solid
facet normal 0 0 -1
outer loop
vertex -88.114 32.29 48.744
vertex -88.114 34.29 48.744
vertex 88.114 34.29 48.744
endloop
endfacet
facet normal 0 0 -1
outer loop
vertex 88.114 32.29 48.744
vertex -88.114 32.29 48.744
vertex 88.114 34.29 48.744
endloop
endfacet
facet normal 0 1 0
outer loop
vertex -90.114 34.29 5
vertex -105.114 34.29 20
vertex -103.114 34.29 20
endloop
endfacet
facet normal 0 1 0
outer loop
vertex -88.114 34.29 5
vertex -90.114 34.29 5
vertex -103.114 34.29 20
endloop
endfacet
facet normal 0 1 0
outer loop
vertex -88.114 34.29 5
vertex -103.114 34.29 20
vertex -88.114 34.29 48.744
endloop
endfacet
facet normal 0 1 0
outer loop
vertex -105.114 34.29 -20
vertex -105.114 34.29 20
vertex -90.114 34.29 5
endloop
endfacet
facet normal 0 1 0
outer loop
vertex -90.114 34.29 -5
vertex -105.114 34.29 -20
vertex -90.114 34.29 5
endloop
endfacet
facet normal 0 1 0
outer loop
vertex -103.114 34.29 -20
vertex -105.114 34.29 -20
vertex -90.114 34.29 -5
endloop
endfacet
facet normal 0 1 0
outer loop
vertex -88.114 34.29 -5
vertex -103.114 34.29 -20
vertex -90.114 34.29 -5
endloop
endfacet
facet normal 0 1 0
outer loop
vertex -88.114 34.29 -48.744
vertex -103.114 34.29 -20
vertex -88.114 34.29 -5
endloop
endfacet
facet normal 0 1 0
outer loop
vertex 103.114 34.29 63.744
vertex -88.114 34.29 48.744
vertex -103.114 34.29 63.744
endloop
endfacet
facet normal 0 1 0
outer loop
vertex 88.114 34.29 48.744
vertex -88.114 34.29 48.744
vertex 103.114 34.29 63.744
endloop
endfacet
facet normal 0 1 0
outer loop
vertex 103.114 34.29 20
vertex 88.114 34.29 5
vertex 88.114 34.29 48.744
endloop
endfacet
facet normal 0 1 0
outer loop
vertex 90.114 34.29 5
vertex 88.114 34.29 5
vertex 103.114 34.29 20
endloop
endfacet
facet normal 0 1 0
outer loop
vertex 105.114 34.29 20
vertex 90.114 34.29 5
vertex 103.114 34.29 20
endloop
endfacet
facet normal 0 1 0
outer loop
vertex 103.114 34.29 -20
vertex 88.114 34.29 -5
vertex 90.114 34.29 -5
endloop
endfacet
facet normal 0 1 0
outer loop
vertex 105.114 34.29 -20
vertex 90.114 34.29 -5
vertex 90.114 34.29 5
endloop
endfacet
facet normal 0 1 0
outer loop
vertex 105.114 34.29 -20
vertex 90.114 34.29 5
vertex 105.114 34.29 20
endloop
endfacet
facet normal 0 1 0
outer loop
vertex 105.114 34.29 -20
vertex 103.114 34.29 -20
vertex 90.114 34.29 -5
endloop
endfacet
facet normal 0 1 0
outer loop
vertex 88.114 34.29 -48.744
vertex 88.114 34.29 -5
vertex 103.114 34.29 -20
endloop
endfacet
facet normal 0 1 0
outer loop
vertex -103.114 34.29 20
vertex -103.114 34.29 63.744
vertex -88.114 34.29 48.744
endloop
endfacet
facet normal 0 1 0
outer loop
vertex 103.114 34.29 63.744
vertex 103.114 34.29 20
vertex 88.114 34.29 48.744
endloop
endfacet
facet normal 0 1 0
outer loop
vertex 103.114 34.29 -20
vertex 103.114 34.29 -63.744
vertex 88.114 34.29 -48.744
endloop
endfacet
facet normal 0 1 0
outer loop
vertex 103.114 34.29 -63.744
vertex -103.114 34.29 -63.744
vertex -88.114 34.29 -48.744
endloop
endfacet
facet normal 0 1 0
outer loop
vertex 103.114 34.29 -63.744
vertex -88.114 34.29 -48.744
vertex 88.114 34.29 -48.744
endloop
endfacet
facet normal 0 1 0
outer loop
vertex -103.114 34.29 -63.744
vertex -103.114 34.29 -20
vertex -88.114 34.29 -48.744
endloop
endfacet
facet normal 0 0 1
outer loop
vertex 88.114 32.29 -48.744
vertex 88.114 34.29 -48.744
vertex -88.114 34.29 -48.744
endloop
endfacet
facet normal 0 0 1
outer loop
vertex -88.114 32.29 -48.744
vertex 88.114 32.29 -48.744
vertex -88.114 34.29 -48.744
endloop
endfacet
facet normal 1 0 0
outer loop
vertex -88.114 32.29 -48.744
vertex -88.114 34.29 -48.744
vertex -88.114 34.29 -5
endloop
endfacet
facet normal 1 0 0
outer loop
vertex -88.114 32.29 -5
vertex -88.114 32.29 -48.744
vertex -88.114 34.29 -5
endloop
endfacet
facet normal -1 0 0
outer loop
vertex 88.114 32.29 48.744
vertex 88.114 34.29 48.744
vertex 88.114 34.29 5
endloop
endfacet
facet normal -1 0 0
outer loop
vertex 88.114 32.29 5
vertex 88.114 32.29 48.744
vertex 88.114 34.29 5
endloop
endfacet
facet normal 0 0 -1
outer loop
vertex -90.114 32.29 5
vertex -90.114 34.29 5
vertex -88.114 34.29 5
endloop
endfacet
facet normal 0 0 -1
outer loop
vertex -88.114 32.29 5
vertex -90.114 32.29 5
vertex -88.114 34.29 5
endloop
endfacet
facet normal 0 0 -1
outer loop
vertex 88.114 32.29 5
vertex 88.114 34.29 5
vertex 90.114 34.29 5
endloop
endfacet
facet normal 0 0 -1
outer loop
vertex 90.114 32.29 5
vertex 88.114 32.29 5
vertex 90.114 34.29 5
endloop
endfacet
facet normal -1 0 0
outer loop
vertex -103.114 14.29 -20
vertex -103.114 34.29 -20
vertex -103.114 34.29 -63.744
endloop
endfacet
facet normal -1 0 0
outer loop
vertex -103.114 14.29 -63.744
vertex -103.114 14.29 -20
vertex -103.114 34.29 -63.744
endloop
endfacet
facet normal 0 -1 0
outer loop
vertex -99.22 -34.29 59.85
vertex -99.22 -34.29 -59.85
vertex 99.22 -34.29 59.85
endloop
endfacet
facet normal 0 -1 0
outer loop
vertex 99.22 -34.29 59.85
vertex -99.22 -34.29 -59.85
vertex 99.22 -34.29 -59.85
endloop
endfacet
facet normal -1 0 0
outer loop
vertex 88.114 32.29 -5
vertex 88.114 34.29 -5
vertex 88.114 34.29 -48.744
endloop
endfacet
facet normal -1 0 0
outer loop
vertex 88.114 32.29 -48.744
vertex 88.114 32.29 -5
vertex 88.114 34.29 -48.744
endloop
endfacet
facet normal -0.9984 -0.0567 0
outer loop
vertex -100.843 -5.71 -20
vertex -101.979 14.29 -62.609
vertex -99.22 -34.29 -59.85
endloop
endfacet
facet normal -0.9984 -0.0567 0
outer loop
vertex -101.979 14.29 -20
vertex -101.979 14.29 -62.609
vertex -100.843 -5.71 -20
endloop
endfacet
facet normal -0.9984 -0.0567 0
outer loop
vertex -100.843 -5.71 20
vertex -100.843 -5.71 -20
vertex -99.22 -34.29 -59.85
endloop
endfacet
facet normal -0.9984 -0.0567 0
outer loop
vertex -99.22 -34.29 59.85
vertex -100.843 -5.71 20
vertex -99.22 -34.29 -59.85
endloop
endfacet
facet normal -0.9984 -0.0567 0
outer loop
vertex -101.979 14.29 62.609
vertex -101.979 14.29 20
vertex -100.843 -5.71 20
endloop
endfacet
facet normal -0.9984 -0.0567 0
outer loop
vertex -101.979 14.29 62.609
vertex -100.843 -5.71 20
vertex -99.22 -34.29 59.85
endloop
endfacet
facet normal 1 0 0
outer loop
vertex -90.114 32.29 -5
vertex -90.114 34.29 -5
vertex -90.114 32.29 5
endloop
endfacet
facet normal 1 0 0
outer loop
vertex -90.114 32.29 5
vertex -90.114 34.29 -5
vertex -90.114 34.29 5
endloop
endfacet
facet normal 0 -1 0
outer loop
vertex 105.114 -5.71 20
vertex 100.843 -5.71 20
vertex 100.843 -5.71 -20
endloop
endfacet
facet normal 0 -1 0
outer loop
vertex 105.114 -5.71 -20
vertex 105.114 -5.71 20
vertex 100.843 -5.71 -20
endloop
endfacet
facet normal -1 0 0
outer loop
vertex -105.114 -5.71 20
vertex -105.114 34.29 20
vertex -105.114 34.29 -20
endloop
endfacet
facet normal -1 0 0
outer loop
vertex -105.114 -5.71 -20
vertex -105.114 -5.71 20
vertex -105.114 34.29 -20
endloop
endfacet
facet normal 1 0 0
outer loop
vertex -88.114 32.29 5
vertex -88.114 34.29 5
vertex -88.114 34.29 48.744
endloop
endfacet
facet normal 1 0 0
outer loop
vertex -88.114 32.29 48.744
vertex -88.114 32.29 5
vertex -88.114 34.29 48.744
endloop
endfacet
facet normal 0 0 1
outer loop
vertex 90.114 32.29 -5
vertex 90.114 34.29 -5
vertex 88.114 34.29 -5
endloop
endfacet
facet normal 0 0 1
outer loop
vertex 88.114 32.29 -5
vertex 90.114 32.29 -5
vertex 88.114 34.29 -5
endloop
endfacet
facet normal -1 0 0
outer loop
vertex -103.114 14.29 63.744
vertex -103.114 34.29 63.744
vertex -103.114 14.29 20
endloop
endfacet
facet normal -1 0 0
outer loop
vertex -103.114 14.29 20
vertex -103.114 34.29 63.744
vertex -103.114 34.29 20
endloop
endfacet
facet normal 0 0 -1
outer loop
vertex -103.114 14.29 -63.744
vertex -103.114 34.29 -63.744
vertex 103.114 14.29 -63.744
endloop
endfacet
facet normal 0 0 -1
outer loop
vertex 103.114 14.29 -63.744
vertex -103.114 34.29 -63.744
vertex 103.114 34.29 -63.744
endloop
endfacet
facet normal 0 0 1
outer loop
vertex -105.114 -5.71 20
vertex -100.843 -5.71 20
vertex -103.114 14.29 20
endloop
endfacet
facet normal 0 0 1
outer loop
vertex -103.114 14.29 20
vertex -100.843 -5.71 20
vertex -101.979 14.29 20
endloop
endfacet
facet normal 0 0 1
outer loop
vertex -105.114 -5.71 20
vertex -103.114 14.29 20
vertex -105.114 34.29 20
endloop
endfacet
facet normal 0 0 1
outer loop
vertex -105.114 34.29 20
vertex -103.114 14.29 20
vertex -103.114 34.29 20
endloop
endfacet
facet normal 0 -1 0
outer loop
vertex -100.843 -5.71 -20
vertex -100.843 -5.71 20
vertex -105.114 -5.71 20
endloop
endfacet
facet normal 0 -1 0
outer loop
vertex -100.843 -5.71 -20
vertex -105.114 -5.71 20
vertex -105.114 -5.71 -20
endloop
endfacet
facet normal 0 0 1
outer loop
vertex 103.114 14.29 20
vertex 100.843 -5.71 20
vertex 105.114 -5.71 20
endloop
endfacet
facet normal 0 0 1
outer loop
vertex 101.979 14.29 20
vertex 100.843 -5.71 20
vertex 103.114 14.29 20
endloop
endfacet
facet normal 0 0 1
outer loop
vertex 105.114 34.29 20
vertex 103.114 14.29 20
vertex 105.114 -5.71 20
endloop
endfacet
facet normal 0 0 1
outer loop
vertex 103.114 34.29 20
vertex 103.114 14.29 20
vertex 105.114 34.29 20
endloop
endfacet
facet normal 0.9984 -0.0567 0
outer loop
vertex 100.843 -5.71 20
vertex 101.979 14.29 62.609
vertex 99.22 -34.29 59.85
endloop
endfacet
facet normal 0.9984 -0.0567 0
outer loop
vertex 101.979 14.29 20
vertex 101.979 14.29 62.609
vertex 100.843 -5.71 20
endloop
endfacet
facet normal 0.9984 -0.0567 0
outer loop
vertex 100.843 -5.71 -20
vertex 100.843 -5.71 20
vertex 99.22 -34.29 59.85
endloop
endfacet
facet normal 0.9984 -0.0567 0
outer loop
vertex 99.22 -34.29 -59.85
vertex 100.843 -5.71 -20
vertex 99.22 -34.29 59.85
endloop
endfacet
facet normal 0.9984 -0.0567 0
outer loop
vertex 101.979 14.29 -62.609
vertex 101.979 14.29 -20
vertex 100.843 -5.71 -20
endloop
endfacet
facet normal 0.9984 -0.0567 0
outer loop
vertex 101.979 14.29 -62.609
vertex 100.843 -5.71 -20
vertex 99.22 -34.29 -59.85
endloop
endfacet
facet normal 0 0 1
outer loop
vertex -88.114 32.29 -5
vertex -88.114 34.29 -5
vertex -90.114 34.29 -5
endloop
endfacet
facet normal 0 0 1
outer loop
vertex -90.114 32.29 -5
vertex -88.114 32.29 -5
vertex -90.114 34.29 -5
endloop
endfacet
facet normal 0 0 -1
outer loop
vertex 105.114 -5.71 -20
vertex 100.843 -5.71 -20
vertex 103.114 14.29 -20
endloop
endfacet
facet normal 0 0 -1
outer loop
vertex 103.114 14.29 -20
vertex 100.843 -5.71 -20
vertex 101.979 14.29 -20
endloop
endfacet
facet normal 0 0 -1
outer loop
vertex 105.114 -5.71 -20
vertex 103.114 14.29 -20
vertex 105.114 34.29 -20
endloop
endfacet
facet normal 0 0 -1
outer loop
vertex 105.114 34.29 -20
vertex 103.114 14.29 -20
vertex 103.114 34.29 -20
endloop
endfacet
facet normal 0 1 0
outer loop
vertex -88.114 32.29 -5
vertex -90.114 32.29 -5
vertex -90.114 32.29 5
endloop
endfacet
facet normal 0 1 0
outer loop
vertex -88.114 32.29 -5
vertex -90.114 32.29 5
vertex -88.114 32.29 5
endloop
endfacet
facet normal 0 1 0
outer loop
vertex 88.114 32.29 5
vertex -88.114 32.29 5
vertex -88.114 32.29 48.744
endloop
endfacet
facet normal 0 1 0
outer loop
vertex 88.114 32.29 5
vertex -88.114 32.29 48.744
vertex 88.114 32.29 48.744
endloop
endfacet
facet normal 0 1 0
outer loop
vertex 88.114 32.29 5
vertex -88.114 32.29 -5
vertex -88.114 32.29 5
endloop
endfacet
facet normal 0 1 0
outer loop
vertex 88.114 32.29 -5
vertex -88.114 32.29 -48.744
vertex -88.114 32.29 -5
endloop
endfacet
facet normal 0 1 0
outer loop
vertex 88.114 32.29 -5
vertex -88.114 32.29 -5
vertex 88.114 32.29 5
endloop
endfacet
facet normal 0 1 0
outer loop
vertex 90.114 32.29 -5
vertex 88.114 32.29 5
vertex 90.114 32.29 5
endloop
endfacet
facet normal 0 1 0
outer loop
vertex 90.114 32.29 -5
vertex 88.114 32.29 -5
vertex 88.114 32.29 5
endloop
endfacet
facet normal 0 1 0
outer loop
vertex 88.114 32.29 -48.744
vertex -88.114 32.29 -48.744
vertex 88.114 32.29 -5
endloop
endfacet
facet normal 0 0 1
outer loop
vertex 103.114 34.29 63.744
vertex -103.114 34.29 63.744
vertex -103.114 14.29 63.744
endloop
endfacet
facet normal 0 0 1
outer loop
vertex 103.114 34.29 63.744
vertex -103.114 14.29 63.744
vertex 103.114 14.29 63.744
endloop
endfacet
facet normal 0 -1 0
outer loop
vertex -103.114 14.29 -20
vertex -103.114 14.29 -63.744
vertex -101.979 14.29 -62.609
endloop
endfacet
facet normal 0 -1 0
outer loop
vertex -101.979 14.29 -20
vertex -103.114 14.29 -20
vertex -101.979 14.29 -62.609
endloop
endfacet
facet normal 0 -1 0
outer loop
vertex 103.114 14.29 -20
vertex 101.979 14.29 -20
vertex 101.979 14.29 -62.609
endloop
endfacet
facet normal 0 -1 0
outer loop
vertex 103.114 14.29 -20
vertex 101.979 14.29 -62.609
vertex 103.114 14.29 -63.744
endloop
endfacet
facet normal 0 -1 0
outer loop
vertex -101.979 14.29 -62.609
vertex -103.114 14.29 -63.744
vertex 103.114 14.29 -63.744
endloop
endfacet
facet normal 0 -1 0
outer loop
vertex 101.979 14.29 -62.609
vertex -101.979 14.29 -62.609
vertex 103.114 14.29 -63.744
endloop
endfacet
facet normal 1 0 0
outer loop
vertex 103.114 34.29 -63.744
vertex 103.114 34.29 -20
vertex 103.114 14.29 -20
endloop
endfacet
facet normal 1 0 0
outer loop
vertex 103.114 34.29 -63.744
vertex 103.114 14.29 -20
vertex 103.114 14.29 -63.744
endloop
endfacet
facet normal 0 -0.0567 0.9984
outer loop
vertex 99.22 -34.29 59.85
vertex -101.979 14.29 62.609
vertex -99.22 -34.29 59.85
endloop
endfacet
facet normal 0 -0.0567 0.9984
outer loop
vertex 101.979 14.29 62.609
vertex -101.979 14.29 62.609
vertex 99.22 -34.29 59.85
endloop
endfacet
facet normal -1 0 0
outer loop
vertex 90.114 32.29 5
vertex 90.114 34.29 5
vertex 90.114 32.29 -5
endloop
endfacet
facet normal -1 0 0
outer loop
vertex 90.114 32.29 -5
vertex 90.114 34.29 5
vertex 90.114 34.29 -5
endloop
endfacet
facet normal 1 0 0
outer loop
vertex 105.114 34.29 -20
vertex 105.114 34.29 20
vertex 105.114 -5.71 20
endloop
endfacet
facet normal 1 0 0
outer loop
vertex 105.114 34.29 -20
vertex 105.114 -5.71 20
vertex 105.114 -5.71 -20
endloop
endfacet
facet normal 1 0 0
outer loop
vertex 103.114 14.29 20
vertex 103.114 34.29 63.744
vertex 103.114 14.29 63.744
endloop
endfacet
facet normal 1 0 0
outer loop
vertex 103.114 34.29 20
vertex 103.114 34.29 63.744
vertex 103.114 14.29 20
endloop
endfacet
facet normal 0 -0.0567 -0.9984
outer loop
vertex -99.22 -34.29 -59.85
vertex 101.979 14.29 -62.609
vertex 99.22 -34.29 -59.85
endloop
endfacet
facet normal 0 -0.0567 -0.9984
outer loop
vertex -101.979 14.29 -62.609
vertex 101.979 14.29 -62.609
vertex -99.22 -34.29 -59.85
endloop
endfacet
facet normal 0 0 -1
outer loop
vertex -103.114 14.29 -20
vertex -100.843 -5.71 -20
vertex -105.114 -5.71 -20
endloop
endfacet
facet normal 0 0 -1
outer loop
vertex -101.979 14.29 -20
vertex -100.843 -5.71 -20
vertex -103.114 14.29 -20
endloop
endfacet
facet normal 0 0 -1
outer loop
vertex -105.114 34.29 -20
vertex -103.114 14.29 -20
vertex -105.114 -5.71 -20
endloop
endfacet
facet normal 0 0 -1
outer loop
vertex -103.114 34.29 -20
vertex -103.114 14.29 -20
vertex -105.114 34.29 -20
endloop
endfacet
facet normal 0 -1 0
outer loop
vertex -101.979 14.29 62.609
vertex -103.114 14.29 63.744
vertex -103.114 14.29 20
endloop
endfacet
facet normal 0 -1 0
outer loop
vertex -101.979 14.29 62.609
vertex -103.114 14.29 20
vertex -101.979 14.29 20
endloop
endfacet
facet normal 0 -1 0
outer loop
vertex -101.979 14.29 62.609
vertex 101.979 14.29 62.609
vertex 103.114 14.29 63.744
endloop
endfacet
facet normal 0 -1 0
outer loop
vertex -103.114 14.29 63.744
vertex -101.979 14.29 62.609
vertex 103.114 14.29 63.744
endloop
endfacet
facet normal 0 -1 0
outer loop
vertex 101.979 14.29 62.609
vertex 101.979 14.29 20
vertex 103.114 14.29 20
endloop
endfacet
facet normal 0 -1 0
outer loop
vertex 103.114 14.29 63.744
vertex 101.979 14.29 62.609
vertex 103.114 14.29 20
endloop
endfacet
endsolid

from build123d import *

# Parameters (mm, degrees)
SKETCH1_W           = 218.44
SKETCH1_H           = 139.7
BOSS_EXTRUDE1_DEPTH = 34.29
SKETCH2_W           = 238.44
SKETCH2_H           = 159.7
SKETCH2_W_2         = 198.44
SKETCH2_H_2         = 119.7
CUT_EXTRUDE1_DEPTH  = 172.72
CUT_EXTRUDE1_TAPER  = 3.25
SKETCH3_W           = 206.22850923
SKETCH3_H           = 127.48850923
BOSS_EXTRUDE2_DEPTH = 20
BOSS_EXTRUDE3_START = -20
SKETCH4_W           = 40
SKETCH4_H           = 40
BOSS_EXTRUDE3_DEPTH = 22
CUT_EXTRUDE2_DEPTH  = 2


with BuildPart() as part:
    # Sketch1 → Boss-Extrude1 (new body, symmetric)
    with BuildSketch(Plane(origin=(0, 0, 0), x_dir=(1, 0, 0), z_dir=(0, 1, 0))):
        Rectangle(SKETCH1_W, SKETCH1_H)
    extrude(amount=BOSS_EXTRUDE1_DEPTH, both=True)

    # Sketch2 → Cut-Extrude1 (cut)
    with BuildSketch(Plane.XZ.offset(34.29)):
        Rectangle(SKETCH2_W, SKETCH2_H)
        Rectangle(SKETCH2_W_2, SKETCH2_H_2, mode=Mode.SUBTRACT)
    extrude(amount=-CUT_EXTRUDE1_DEPTH, taper=CUT_EXTRUDE1_TAPER, mode=Mode.SUBTRACT)

    # Sketch3 → Boss-Extrude2 (add)
    with BuildSketch(Plane(origin=(0, 34.29, 0), x_dir=(1, 0, 0), z_dir=(0, 1, 0))):
        Rectangle(SKETCH3_W, SKETCH3_H)
    extrude(amount=-BOSS_EXTRUDE2_DEPTH)

    # Sketch4 → Boss-Extrude3 (add)
    with BuildSketch(Plane(origin=(103.114254615, 0, 0), x_dir=(0, 0, -1), z_dir=(1, 0, 0)).offset(BOSS_EXTRUDE3_START)):
        with Locations((0, 14.29)):
            Rectangle(SKETCH4_W, SKETCH4_H)
    boss_extrude3 = extrude(amount=BOSS_EXTRUDE3_DEPTH)

    # Mirror1: Boss-Extrude3 across plane
    add(boss_extrude3.mirror(Plane(origin=(0, 0, 0), x_dir=(0, 0, 1), z_dir=(1, 0, 0))))

    # Sketch5 → Cut-Extrude2 (cut)
    with BuildSketch(Plane(origin=(0, 34.29, 0), x_dir=(1, 0, 0), z_dir=(0, 1, 0))):
        Polygon((-88.114254615, 48.744254615), (-88.114254615, 5), (-90.114254615, 5), (-90.114254615, -5), (-88.114254615, -5), (-88.114254615, -48.744254615), (88.114254615, -48.744254615), (88.114254615, -5), (90.114254615, -5), (90.114254615, 5), (88.114254615, 5), (88.114254615, 48.744254615), align=None)
    extrude(amount=-CUT_EXTRUDE2_DEPTH, mode=Mode.SUBTRACT)


solid = part.part
